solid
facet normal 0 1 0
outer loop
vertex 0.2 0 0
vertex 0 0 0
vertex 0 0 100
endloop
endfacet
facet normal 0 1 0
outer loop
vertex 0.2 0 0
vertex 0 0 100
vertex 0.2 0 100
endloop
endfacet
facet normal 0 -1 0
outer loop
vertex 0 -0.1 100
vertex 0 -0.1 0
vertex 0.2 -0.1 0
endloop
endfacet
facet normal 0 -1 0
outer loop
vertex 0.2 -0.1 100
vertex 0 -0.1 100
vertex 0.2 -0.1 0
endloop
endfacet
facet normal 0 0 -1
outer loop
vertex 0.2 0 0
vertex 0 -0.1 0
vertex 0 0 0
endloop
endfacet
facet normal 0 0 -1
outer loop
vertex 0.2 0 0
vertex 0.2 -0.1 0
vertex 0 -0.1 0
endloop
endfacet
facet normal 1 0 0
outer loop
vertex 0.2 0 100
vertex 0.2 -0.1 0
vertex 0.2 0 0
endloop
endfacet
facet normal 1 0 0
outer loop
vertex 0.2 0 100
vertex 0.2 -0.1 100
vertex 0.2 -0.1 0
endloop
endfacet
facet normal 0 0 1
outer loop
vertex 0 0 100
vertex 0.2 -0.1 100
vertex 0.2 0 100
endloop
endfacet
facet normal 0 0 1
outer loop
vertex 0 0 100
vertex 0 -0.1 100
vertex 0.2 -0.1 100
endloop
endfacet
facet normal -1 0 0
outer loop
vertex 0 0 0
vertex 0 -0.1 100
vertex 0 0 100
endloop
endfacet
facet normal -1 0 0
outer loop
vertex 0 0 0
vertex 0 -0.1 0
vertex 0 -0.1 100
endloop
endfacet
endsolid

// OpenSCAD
strokeWdth=0.2;
strokeThck=0.1;

rotate([90,0,0]) linear_extrude(strokeThck) square([strokeWdth,100]);
